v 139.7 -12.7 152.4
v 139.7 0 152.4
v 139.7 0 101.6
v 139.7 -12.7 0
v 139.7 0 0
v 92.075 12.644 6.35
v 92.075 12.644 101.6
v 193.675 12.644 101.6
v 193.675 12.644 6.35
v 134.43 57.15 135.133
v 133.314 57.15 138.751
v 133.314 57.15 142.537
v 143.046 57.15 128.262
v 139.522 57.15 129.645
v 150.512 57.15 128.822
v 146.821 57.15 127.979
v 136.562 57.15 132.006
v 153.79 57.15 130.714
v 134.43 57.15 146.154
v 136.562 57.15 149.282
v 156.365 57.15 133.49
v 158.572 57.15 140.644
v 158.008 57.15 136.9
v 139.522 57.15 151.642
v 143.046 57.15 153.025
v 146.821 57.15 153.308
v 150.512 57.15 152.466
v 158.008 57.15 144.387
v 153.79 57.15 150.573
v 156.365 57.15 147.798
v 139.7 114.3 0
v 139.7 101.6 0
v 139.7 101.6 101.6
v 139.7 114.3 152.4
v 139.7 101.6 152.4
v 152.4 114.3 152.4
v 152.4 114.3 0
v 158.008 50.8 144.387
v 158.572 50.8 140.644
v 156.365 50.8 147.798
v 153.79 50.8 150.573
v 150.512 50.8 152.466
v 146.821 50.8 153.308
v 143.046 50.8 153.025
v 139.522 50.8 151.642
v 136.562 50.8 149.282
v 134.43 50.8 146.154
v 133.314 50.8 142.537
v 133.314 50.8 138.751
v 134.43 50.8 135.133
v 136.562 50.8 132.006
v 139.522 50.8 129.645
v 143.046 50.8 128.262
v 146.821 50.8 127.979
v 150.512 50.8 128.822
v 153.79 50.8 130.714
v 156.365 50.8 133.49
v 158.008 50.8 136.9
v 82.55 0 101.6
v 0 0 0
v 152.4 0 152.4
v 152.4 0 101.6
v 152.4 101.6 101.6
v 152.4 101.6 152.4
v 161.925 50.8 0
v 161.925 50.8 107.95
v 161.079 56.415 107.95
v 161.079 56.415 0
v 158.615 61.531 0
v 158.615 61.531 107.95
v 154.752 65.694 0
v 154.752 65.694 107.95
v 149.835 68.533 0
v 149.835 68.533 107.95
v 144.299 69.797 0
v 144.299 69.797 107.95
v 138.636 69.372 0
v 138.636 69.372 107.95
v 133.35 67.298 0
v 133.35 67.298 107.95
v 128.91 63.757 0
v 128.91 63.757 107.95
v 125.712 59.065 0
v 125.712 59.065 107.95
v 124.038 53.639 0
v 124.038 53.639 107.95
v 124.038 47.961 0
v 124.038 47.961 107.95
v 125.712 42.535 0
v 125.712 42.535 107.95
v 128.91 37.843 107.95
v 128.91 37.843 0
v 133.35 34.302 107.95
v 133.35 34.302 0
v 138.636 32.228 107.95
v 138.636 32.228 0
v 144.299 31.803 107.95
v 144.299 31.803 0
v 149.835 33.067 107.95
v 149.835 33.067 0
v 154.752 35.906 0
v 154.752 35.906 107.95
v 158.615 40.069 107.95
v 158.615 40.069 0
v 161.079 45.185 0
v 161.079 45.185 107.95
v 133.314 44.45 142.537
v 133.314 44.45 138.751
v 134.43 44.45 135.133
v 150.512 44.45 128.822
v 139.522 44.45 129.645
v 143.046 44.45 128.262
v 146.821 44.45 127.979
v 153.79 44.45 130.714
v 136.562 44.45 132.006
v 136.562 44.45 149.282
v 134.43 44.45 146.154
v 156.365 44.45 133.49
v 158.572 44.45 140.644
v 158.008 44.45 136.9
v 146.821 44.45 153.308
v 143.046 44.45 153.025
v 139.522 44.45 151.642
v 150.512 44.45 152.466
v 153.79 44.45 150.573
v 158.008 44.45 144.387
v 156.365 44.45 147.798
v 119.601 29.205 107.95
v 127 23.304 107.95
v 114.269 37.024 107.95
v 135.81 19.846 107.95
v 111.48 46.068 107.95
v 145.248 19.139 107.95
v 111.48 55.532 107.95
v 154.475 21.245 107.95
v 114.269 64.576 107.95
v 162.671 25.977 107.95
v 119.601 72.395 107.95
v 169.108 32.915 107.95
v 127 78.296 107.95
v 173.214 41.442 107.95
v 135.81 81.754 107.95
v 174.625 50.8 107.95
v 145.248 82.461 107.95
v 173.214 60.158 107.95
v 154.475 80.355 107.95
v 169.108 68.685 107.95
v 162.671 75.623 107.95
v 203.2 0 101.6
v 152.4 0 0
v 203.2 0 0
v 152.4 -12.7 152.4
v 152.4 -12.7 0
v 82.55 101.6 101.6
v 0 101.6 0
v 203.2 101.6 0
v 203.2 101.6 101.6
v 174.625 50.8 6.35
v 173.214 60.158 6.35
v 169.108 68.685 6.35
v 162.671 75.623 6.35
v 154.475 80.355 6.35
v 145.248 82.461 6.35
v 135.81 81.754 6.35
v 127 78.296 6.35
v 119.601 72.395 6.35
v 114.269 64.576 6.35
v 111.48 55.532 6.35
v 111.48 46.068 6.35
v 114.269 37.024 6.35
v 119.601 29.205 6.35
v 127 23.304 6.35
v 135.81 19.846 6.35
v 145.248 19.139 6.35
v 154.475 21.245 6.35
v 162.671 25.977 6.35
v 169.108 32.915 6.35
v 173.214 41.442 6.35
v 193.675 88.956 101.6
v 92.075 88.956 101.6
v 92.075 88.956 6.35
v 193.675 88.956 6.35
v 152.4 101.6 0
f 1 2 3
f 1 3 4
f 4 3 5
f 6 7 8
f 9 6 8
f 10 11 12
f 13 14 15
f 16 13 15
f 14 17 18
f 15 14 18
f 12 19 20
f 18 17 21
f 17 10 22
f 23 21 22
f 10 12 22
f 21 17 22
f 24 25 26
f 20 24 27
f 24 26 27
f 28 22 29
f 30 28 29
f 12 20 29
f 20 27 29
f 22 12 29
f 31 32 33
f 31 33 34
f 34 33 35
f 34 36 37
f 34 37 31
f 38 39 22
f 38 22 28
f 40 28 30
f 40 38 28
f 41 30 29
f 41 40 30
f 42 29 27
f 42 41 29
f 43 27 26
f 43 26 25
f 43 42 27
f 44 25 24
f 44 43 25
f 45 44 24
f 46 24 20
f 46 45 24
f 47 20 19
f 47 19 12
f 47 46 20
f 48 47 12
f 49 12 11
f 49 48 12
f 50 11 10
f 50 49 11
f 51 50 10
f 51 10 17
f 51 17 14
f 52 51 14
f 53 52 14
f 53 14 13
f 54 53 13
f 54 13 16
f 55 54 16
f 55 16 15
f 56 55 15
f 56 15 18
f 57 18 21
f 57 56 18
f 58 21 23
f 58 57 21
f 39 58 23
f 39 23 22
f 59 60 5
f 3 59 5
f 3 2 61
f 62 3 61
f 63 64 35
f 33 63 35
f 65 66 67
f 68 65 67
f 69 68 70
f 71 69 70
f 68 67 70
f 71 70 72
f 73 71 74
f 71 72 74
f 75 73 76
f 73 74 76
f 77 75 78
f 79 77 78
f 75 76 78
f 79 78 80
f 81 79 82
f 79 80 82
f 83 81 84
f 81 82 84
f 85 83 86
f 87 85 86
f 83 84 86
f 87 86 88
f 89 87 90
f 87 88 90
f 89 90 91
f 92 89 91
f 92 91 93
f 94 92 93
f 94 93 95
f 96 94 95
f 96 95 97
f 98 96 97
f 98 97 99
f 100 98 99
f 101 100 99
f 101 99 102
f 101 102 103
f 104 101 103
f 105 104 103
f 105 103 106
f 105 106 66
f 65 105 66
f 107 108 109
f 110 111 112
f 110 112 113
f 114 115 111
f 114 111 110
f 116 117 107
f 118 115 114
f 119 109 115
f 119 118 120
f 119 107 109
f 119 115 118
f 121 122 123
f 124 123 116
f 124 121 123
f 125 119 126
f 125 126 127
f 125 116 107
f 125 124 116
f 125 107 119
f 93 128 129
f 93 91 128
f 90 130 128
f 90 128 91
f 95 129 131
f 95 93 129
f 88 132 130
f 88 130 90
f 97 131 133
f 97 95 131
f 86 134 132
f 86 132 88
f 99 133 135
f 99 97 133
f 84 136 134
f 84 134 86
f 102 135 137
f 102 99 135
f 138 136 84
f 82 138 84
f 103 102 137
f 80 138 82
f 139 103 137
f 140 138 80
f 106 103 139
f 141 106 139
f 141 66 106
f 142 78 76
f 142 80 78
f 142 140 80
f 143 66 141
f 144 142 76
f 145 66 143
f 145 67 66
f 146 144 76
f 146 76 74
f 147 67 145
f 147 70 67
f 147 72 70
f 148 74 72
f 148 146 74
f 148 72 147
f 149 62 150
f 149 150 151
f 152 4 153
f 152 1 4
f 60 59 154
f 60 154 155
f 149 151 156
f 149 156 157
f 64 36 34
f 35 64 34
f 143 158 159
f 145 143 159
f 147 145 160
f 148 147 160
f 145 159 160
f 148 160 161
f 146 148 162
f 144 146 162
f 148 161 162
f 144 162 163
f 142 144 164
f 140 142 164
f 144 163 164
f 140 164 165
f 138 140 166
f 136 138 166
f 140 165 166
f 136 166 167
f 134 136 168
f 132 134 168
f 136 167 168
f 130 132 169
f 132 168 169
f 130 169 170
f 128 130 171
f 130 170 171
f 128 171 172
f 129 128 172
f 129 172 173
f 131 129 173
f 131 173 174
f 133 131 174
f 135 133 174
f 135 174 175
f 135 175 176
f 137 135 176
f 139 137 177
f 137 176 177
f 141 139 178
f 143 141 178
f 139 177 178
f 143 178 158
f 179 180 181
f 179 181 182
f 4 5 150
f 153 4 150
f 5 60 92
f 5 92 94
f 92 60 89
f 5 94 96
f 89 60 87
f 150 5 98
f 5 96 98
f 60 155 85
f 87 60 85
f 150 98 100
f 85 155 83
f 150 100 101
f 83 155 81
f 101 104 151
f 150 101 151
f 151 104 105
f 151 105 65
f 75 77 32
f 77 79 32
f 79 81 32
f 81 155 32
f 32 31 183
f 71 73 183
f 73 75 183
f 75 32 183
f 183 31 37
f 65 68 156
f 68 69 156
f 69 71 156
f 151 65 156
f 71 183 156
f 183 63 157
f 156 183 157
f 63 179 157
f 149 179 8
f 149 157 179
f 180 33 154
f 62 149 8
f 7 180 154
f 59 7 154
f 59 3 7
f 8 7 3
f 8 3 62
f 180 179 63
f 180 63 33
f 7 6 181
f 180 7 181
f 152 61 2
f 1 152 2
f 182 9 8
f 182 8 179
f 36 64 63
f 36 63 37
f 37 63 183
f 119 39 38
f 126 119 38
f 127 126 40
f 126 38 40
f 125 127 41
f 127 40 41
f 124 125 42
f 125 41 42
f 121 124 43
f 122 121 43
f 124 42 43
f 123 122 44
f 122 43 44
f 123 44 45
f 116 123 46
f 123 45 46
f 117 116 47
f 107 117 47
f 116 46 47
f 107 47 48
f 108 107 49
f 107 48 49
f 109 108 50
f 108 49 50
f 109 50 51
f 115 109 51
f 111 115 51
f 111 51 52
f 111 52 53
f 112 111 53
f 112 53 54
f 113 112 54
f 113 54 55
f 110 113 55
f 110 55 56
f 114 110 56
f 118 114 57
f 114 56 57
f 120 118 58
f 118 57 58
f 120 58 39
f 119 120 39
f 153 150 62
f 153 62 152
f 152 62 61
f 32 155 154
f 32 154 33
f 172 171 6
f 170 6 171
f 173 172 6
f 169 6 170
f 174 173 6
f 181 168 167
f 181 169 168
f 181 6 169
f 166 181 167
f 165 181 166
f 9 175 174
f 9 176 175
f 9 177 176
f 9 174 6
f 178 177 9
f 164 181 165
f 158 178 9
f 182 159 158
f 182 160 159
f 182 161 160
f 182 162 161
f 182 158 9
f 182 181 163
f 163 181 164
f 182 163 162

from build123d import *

# Parameters (mm, degrees)
F1_DEPTH  = 101.6
F2_W      = 101.6
F2_H      = 76.311862731
F3_DEPTH  = 95.25
F4_R      = 31.75
F5_DEPTH  = 101.6
F6_R      = 19.05
F7_DEPTH  = 159.004
F9_W      = 12.7
F9_H      = 50.8
F9_H_2    = 101.6
F10_DEPTH = 12.7
F12_DEPTH = 12.7
F17_R     = 12.7
F18_DEPTH = 6.35
F19_DEPTH = 6.35


# Not quite as in the source:
# - the program builds the solid bodies; features that only make, move or delete a surface that nothing else refers to are left out


with BuildPart() as f1:
    # F0 (on Front) → F1 (new body)
    with BuildSketch(Plane.XZ):
        Polygon((82.55, 101.6), (0, 0), (203.2, 0), (203.2, 101.6), align=None)
    extrude(amount=-F1_DEPTH)

    # F2 (on face) → F3 (cut)
    with BuildSketch(Plane.XY.offset(101.6)):
        with Locations((142.875, 50.8)):
            Rectangle(F2_W, F2_H)
    extrude(amount=-F3_DEPTH, mode=Mode.SUBTRACT)

    # F4 (on face) → F5 (join)
    with BuildSketch(Plane.XY.offset(6.35)):
        with Locations((142.875, 50.8)):
            Circle(F4_R)
    extrude(amount=F5_DEPTH)

    # F6 (on face) → F7 (cut)
    with BuildSketch(Plane.XY.offset(107.95)):
        with Locations((142.875, 50.8)):
            Circle(F6_R)
    extrude(amount=-F7_DEPTH, mode=Mode.SUBTRACT)

    # F9 (on face) → F10 (join)
    with BuildSketch(Plane(origin=(0, 101.6, 0), x_dir=(-1, 0, 0), z_dir=(0, 1, 0))):
        with Locations((-146.05, 127)):
            Rectangle(F9_W, F9_H)
        with Locations((-146.05, 50.8)):
            Rectangle(F9_W, F9_H_2)
    extrude(amount=F10_DEPTH)

    # F11 (on face) → F12 (join)
    with BuildSketch(Plane.XZ):
        Polygon((139.7, 0), (152.4, 0), (152.4, 101.6), (152.4, 152.4), (139.7, 152.4), (139.7, 101.6), align=None)
    extrude(amount=F12_DEPTH)


with BuildPart() as f18:
    # F17 (on offset) → F18 (new body)
    with BuildSketch(Plane.XZ.offset(-50.8)):
        with Locations((145.8720415831, 140.6437456608)):
            Circle(F17_R)
    extrude(amount=-F18_DEPTH)

    # F19 (add): a face of the model
    f19_faces = [f18.faces().sort_by_distance(p)[0] for p in [
        (145.8720415831, 50.8, 140.6437456608),
    ]]
    extrude(f19_faces, amount=F19_DEPTH)


solid = Compound([f1.part, f18.part])
